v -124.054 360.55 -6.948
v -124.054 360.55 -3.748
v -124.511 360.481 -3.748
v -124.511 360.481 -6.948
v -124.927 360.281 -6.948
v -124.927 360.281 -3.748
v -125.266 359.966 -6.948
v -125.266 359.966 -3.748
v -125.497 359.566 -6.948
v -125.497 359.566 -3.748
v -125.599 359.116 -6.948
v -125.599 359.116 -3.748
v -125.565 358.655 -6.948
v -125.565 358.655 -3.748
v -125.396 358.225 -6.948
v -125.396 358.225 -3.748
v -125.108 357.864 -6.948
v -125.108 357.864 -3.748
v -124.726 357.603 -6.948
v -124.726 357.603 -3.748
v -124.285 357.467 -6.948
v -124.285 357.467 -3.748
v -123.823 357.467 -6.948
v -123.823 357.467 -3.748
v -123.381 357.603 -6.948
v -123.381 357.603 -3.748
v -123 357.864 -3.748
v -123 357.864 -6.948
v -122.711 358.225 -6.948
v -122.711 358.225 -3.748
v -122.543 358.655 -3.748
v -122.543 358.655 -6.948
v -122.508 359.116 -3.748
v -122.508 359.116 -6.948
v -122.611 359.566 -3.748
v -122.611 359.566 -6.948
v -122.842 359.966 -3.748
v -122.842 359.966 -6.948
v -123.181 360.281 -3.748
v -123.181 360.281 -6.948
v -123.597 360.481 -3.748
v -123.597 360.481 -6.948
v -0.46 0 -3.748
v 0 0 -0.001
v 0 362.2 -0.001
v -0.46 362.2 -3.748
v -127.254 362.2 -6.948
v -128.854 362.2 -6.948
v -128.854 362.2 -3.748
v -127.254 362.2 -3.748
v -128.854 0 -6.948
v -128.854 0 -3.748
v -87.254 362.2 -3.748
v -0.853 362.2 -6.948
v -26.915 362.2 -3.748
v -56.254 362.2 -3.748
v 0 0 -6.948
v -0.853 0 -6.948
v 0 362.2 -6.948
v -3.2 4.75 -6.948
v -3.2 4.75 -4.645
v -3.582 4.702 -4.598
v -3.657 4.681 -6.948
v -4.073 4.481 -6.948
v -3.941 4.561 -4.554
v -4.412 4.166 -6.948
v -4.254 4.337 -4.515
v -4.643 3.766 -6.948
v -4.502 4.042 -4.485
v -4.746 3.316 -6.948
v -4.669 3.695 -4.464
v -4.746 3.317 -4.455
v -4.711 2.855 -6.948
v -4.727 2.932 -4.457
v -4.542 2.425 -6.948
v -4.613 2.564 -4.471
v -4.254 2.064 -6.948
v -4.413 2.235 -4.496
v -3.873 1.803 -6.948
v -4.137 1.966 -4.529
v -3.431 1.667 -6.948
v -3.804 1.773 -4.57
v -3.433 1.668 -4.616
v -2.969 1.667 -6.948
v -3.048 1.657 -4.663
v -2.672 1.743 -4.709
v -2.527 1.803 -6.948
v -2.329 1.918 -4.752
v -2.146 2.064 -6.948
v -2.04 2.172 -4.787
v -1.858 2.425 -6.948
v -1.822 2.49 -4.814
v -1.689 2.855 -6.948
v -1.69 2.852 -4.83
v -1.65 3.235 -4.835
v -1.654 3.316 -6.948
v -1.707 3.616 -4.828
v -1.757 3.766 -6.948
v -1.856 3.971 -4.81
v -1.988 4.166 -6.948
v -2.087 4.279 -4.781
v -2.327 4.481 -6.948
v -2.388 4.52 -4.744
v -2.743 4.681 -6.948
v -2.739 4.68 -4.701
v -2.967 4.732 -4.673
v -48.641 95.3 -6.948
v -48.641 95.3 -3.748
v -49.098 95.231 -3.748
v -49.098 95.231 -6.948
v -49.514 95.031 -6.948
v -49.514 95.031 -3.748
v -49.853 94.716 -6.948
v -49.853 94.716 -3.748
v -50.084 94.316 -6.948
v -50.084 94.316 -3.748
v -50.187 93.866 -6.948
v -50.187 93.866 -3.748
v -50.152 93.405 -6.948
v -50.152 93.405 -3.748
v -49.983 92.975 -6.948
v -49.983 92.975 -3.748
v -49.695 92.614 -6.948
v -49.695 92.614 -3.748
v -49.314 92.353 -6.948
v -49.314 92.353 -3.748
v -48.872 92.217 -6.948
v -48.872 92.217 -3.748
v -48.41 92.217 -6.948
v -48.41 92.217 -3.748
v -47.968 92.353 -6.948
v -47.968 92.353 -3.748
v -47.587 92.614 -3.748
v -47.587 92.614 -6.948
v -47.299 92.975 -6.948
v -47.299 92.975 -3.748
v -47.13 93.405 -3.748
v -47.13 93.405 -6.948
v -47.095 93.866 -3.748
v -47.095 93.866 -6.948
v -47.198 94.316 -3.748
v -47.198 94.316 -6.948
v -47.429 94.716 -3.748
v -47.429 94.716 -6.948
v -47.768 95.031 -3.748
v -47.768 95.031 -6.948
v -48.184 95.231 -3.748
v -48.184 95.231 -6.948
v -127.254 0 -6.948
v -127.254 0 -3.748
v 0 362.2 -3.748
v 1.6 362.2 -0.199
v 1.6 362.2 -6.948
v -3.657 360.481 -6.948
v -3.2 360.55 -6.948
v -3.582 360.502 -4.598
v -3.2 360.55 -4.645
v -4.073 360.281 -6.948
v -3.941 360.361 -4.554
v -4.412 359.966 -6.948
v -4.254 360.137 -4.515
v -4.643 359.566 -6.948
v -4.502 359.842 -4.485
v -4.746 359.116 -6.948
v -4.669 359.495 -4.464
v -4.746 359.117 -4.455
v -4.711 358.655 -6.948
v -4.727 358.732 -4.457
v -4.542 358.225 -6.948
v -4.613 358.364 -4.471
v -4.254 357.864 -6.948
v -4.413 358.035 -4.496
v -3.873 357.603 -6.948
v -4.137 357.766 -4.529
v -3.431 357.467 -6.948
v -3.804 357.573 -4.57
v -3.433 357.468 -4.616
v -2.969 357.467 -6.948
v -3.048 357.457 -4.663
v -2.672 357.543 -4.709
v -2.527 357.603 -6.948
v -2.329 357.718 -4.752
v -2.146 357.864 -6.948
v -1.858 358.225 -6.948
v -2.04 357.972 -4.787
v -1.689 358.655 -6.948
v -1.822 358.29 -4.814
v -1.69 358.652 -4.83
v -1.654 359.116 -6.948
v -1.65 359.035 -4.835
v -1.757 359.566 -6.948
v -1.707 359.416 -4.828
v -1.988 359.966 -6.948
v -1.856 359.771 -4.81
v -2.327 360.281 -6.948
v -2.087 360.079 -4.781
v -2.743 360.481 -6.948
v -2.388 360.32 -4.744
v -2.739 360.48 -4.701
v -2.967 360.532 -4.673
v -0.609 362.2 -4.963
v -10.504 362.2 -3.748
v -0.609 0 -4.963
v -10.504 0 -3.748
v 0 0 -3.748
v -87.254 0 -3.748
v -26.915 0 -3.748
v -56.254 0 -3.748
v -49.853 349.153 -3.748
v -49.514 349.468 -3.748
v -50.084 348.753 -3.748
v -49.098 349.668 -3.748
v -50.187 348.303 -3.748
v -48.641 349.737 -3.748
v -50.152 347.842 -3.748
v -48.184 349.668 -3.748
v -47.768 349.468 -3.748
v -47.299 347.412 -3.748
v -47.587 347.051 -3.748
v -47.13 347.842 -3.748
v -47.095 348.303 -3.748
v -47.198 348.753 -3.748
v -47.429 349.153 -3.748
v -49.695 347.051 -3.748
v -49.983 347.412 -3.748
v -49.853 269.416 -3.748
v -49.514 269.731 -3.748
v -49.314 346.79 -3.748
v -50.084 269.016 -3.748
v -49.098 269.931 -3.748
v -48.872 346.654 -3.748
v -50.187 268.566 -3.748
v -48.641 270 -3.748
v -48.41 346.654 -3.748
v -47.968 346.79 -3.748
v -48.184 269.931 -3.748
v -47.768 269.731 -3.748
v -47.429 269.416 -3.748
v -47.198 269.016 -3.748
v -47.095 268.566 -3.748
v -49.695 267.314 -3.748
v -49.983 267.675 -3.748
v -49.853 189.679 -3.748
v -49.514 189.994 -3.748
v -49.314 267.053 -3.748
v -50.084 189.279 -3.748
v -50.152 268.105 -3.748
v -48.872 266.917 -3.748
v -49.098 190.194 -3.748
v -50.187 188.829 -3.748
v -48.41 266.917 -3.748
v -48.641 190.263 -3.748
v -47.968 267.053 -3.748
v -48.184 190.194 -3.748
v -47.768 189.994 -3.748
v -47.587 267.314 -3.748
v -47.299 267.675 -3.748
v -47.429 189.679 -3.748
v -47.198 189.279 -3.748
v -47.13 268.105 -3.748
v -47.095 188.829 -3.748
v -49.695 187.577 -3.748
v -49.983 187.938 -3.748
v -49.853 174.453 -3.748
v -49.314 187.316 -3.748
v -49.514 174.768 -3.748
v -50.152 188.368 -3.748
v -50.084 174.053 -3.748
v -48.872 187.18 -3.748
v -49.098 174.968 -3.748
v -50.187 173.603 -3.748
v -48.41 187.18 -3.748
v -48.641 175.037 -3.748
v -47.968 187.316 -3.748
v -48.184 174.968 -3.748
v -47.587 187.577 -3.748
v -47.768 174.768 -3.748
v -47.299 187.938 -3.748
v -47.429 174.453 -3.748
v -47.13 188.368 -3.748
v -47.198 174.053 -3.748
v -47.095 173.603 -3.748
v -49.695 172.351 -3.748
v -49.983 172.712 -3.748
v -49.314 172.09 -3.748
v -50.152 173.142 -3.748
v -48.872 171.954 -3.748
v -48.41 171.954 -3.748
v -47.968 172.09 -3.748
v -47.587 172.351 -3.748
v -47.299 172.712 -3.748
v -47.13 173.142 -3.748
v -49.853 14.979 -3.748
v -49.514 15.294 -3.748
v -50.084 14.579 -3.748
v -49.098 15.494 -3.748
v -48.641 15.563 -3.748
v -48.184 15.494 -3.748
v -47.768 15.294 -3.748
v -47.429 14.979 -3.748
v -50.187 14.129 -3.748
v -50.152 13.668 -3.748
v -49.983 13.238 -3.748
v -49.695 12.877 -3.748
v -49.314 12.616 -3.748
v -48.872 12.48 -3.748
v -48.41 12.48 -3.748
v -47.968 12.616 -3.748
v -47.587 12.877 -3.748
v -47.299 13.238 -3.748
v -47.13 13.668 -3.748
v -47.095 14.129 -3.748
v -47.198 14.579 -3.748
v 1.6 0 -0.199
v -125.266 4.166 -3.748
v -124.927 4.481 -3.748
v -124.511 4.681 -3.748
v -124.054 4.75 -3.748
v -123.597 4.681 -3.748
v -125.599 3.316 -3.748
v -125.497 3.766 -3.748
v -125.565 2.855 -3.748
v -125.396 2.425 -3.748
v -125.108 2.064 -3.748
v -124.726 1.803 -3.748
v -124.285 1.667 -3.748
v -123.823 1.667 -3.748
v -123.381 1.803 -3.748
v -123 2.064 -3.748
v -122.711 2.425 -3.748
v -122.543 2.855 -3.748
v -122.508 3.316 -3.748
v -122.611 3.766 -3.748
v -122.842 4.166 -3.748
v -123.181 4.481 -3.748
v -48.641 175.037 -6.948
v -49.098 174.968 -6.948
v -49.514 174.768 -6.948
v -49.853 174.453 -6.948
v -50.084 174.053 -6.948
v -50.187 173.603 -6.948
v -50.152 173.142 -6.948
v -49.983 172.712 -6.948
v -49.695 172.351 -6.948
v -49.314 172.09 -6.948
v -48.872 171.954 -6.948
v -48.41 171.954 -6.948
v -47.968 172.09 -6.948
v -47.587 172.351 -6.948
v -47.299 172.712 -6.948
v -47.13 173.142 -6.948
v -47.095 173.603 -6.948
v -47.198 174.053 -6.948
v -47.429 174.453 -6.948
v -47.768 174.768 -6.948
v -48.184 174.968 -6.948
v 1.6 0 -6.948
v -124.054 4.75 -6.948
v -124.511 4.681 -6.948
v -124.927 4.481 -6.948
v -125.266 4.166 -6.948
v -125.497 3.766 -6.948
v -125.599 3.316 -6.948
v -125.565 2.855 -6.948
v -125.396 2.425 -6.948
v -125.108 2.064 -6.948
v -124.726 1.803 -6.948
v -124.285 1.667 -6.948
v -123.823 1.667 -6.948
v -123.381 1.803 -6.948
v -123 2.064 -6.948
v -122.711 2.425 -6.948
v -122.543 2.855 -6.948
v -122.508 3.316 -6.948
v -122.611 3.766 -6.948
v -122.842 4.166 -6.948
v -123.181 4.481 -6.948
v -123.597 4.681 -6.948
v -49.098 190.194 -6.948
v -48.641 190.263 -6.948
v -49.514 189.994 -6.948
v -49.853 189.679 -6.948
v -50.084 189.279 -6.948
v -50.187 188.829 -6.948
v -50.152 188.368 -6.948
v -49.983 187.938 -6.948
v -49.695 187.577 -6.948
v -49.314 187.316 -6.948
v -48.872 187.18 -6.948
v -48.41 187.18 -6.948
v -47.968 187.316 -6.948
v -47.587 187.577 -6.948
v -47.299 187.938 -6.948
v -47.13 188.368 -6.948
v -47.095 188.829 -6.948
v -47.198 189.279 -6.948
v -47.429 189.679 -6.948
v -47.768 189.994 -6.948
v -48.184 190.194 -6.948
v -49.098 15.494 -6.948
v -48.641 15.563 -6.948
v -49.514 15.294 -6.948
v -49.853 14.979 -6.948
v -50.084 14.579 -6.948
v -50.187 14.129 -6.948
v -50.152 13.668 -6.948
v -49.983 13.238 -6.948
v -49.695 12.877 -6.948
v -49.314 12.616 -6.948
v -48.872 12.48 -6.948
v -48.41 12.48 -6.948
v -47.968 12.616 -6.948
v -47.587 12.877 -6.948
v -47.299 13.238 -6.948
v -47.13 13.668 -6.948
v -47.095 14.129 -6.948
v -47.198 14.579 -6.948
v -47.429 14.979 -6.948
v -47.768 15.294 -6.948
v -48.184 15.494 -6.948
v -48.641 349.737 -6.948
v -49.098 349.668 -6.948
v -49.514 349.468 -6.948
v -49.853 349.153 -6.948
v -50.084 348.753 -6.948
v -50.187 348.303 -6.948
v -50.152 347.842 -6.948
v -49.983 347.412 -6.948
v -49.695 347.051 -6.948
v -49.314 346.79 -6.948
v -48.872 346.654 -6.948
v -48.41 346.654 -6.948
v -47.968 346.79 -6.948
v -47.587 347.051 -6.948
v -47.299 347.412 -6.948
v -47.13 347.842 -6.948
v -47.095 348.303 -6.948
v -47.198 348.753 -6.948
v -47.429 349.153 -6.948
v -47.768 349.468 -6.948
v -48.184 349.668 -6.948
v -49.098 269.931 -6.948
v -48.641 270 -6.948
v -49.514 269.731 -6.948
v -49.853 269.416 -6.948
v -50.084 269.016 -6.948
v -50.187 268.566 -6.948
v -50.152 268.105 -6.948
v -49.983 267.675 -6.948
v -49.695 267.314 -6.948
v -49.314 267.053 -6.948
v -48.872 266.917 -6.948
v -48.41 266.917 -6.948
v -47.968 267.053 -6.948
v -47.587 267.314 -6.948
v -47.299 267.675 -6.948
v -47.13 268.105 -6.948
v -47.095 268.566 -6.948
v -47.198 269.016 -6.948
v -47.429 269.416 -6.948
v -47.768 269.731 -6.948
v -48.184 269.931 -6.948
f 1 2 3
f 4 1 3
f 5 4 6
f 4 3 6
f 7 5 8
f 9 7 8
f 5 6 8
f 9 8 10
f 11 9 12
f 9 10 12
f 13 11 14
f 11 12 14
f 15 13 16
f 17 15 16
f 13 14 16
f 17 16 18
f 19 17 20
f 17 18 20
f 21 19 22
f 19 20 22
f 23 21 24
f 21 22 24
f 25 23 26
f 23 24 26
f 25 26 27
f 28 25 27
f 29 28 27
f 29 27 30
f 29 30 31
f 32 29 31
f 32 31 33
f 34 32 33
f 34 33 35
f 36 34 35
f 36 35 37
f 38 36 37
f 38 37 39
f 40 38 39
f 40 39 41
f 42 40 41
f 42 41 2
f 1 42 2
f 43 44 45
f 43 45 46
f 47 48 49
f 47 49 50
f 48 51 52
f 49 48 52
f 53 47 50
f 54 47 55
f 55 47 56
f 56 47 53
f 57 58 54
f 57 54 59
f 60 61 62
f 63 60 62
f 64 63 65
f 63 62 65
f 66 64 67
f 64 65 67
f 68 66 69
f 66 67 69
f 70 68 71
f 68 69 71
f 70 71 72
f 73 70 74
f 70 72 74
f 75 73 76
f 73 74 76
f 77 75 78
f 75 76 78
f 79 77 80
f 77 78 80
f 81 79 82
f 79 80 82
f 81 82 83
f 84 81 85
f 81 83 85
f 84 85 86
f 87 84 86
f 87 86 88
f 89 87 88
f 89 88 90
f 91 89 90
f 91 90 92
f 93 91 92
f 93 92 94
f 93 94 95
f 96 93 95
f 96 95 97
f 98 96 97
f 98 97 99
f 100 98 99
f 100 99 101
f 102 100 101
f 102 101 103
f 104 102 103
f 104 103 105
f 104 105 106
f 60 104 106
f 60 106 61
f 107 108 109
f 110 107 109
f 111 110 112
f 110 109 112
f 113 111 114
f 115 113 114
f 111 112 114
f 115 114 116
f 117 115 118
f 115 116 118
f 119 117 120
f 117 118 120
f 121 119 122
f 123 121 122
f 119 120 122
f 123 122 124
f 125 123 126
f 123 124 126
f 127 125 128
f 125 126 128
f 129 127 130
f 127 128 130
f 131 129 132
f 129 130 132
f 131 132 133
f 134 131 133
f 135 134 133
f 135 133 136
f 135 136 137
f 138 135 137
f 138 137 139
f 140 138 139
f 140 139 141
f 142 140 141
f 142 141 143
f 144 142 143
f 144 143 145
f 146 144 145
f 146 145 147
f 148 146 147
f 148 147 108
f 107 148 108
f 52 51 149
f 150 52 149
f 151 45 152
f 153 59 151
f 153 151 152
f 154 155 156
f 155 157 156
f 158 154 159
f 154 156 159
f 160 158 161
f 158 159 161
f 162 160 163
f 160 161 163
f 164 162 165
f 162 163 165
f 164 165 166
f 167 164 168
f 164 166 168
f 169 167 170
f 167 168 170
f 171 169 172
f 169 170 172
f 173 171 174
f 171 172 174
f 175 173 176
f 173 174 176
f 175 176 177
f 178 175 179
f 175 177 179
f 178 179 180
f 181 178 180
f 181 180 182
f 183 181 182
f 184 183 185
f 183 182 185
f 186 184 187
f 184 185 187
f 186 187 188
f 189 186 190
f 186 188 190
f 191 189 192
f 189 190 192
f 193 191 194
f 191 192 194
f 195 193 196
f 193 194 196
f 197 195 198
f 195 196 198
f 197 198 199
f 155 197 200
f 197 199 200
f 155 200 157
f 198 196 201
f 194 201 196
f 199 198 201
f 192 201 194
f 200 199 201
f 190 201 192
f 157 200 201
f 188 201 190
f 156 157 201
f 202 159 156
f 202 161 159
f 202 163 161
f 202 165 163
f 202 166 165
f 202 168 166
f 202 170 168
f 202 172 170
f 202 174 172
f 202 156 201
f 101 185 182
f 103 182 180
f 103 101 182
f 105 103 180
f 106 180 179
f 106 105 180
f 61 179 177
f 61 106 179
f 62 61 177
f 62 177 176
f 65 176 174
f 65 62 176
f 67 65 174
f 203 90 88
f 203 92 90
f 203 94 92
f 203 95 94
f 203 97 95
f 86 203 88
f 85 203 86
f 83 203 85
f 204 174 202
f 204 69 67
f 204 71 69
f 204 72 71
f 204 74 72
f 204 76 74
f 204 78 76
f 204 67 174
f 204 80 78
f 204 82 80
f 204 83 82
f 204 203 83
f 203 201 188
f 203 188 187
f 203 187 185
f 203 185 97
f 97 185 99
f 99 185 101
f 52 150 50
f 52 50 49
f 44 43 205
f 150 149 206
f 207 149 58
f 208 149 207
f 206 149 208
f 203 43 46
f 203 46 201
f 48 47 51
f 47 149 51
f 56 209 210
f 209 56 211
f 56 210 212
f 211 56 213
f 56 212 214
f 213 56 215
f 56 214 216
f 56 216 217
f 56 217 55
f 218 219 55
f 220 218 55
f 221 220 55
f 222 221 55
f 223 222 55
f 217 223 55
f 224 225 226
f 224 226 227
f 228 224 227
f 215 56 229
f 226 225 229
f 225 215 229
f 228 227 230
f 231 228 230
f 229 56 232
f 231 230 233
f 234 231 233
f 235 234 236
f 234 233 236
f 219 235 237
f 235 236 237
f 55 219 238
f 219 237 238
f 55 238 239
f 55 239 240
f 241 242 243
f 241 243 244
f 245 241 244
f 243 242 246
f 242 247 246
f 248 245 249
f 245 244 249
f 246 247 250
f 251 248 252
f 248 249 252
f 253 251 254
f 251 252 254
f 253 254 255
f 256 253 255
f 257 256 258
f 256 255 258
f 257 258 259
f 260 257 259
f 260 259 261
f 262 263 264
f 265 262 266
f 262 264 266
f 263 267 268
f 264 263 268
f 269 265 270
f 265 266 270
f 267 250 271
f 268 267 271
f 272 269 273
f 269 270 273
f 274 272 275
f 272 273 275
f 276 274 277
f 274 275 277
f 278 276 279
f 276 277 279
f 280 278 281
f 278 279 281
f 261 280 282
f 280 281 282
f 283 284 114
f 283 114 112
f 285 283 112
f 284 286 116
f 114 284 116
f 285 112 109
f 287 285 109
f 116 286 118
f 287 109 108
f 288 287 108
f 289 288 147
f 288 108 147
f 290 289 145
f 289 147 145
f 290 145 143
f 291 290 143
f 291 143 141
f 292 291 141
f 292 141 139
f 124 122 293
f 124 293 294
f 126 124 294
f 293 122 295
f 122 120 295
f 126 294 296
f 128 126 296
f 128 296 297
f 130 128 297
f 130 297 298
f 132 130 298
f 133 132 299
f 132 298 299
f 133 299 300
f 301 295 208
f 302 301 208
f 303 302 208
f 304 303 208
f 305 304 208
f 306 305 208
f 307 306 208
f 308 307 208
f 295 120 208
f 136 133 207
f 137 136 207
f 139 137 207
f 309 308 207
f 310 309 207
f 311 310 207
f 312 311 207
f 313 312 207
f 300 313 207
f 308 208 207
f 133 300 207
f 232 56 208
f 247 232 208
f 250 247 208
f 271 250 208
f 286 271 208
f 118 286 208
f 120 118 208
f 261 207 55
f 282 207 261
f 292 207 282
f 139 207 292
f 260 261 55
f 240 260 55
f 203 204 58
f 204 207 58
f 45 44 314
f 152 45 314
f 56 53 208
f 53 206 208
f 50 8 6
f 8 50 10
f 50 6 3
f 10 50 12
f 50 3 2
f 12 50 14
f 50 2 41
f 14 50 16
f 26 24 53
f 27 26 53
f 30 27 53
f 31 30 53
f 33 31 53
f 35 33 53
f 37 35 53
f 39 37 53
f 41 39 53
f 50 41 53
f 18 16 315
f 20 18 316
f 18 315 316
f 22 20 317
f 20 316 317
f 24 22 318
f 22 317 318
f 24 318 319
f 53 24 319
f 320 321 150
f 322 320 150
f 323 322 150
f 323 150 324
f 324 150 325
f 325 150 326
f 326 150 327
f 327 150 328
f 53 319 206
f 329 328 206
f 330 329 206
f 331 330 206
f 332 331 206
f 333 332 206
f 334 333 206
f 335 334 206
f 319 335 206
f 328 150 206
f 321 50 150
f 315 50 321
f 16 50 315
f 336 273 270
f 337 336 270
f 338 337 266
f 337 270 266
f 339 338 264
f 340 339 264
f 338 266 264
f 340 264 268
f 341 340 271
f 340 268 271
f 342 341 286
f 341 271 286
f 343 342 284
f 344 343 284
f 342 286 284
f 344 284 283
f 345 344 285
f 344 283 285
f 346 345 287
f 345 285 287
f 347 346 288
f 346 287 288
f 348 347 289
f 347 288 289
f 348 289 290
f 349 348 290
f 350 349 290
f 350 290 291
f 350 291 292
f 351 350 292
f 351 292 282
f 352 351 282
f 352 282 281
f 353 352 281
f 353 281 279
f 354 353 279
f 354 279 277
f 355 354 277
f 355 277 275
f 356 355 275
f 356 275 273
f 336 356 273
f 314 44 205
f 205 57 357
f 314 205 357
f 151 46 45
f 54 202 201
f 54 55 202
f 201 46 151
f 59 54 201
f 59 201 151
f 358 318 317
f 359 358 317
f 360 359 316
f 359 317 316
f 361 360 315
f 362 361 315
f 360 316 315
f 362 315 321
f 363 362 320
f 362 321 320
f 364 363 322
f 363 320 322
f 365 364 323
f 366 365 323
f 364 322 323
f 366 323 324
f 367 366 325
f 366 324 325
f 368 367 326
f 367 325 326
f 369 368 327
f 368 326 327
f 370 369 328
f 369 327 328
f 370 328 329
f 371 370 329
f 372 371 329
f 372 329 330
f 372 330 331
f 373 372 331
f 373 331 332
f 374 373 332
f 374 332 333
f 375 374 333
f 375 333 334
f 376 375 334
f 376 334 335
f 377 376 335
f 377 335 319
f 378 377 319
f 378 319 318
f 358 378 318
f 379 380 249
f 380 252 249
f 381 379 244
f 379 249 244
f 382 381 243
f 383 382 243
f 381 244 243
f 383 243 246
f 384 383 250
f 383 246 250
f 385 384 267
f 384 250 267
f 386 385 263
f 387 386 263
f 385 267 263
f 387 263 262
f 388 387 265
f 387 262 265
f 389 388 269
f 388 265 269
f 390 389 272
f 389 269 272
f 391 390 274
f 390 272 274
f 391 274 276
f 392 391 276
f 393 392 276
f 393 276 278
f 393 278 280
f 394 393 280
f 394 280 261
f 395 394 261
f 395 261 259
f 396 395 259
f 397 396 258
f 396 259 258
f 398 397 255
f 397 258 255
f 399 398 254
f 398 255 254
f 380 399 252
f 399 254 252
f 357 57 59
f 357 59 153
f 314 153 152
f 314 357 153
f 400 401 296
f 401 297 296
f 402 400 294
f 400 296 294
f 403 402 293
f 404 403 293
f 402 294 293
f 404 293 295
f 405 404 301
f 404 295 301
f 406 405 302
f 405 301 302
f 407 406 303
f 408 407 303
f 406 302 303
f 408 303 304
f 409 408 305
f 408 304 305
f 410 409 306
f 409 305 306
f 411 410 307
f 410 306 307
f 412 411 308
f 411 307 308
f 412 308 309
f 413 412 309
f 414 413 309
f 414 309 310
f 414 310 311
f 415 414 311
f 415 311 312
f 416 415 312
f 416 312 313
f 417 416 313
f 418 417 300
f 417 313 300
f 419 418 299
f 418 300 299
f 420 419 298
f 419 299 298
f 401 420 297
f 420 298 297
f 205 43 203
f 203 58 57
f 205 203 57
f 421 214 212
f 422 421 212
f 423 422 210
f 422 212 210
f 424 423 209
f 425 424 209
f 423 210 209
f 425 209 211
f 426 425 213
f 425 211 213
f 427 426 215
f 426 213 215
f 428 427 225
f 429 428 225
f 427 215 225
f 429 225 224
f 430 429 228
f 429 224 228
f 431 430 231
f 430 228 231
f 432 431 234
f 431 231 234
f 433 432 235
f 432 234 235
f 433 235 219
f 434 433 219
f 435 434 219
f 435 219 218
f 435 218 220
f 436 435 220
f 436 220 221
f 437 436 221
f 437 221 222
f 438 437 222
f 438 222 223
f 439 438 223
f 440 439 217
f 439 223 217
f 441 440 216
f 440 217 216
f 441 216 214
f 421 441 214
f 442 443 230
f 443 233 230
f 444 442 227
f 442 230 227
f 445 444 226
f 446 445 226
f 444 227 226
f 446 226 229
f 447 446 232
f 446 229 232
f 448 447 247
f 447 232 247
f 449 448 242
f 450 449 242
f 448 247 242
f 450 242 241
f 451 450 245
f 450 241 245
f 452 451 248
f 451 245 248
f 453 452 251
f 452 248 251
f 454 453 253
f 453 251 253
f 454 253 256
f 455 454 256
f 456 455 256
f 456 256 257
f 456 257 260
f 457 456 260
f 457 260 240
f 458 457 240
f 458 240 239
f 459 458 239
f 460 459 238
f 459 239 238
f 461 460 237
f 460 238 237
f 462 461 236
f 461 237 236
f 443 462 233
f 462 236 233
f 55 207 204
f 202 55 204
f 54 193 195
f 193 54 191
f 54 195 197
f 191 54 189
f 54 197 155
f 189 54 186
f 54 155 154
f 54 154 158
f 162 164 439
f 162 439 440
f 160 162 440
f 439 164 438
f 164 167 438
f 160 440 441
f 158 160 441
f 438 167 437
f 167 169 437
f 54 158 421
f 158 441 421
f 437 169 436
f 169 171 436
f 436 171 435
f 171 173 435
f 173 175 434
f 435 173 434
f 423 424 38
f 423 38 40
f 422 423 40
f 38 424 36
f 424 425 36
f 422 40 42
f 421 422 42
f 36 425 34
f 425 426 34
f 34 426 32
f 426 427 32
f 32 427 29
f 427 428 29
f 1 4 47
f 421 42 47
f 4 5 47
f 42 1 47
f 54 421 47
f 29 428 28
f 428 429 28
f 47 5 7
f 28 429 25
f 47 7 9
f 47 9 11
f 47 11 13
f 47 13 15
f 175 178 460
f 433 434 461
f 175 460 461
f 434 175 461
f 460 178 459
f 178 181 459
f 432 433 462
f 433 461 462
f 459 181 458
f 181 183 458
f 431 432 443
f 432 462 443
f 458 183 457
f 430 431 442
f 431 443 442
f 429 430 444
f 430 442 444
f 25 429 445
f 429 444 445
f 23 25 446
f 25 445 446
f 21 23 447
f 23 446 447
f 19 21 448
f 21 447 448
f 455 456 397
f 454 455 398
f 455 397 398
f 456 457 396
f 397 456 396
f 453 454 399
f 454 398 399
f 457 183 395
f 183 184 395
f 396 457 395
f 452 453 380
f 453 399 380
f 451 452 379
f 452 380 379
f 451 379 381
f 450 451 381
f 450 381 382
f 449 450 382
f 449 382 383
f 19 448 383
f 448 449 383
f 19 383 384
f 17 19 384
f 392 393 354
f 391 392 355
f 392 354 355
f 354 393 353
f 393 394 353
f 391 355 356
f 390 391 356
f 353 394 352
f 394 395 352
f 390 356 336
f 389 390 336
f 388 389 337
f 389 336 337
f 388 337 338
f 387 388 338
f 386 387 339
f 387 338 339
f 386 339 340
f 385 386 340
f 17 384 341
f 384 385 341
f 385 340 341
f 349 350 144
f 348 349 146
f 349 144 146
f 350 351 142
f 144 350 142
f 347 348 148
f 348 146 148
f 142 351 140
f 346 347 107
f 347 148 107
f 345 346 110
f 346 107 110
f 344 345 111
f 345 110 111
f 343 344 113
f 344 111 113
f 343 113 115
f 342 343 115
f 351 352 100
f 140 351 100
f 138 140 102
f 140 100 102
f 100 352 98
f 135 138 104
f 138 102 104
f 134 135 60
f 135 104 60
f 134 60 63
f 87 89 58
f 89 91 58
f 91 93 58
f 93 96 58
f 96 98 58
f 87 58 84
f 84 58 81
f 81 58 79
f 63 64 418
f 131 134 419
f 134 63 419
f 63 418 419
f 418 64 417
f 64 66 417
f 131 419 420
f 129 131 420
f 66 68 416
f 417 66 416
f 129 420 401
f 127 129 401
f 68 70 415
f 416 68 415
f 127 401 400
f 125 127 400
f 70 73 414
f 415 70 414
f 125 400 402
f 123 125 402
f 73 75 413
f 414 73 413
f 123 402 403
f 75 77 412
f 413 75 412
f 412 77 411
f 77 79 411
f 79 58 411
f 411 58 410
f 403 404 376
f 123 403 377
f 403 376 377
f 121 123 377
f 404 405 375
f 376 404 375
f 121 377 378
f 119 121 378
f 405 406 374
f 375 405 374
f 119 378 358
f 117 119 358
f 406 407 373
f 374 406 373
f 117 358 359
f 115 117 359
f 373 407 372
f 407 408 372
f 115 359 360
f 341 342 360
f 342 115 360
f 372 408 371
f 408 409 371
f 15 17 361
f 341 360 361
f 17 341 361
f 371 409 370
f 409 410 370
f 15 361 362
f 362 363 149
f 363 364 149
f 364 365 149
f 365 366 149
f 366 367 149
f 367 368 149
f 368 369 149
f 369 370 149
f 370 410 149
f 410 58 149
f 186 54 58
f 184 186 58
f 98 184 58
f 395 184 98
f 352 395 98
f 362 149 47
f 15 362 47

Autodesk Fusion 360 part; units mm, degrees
sketch "Sketch1" plane through (0, 0, 0) normal (0, 1, 0) x (1, 0, 0)
  line L0 (0, 0) -> (-127.2538, 0)
  line L1 (-127.2538, 0) -> (-127.2538, -15.6248)
  line L2 (-127.2538, -15.6248) -> (0, 0)
  line L3 (-127.2538, 0) -> (-0.0202, 0)
  line L4 (0, 0) -> (-0.8531, 6.9478)
  line L5 (-0.8531, 6.9478) -> (-127.2538, -8.5722)
  line L6 (-127.2538, 6.9478) -> (-127.2538, -15.6248)
  line L7 (-127.2538, -8.5722) -> (-126.4008, -15.5201)
  line L8 (-0.8531, 6.9478) -> (-127.2538, 6.9478)
  line L9 (-0.8531, 6.9478) -> (0, 6.9478)
  line L10 (0, 6.9478) -> (0, 0)
  line L11 (-127.2538, 3.7478) -> (0, 3.7478)
  line L12 (-127.2538, 0.7478) -> (-56.2538, 0.7478)
  line L13 (-127.2538, 6.9478) -> (-128.8538, 6.9478)
  line L14 (0, 6.9478) -> (1.6, 6.9478)
  line L15 (1.6, 6.9478) -> (1.6, 0.1989)
  line L16 (-0.0202, 0) -> (1.6, 0.1989)
  line L17 (-128.8538, 6.9478) -> (-128.8538, -15.8213)
  line L18 (-127.2538, -15.6248) -> (-128.8538, -15.8213)
  line L19 (-0.6093, 4.9627) -> (-127.0101, -10.5573)
  line L20 (-87.2538, -3.6609) -> (-87.2538, 3.7478)
  line L21 (-56.2538, 3.7478) -> (-56.2538, 0.7478)
  line L22 (-127.2538, 3.7478) -> (-128.8538, 3.7478)
  circle A0 centre (-41.0275, 0) radius 2.1736
  dimension "d2" = 7
  dimension "d7" = 7
  dimension "d16" = 127.35
  dimension "d17" = 3.2
  dimension "d18" = 71
  dimension "d19" = 1.6
  dimension "d20" = 1.6
  dimension "d21" = 2
  dimension "d28" = 40
  dimension "d29" = 3
extrude "Extrude1" add sketch "Sketch1" along normal blind 362.2 contours L4 L10 L11 | L10 L14 L15 L16 | L4 L9 L10 L11 | L4 L5 L11 L19 | L5 L6 L8 L11 | L6 L13 L17 L22
sketch "Sketch2" plane through (0, 362.2, 0) normal (0, 1, 0) x (-1, 0, 0)
  line L0 (128.8538, -3.7478) -> (10.504, -3.7478)
  line L1 (0.0003, -0.0024) -> (-1.6, -0.1989)
  line L2 (-1.6, -0.1989) -> (-1.6, -6.9478)
  line L3 (-1.6, -6.9478) -> (128.8538, -6.9478)
  line L4 (128.8538, -6.9478) -> (128.8538, -3.7478)
  line L5 (0.0003, -0.0024) -> (-1.6, -0.1989)
  line L6 (-1.6, -0.1989) -> (-1.6, -6.9478)
  line L7 (-1.6, -6.9478) -> (128.8538, -6.9478)
  line L8 (128.8538, -6.9478) -> (128.8538, -3.7478)
  line L9 (128.8538, -3.7478) -> (0.0003, -0.0024)
  line L10 (0.6093, -4.9627) -> (0.0003, -0.0024)
  line L11 (10.504, -3.7478) -> (0.6093, -4.9627)
sketch "Sketch3" plane through (0, 0, -6.9478) normal (0, 0, -1) x (1, 0, 0)
  line L0 (1.6, 0) -> (-128.8538, 0)
  line L1 (-128.8538, 0) -> (-128.8538, -362.2)
  line L2 (-128.8538, -362.2) -> (1.6, -362.2)
  line L3 (1.6, -362.2) -> (1.6, 0)
  line L4 (1.6, -362.2) -> (-128.8538, -362.2)
  line L5 (-128.8538, -362.2) -> (-128.8538, 0)
  line L6 (-128.8538, 0) -> (1.6, 0)
  line L7 (1.6, 0) -> (1.6, -362.2)
  circle A0 centre (-124.0538, -3.2) radius 1.55
  circle A1 centre (-3.2, -3.2) radius 1.55
  circle A2 centre (-3.2, -359) radius 1.55
  circle A3 centre (-124.0538, -359) radius 1.55
  line L8 (-48.641, 0) -> (-48.641, -362.2)
  line L9 (-128.8538, -181.1) -> (1.6, -181.1)
  line L10 (-48.641, -268.45) -> (1.6, -268.45)
  circle A4 centre (-48.641, -268.45) radius 1.55
  circle A5 centre (-48.641, -348.187) radius 1.55
  line L11 (-128.8538, -362.2) -> (-0.0003, -362.2)
  circle A6 centre (-48.641, -188.713) radius 1.55
  circle A7 centre (-48.641, -173.487) radius 1.55
  line L12 (-48.641, -93.75) -> (1.6, -93.75)
  circle A8 centre (-48.641, -93.75) radius 1.55
  circle A9 centre (-48.641, -14.013) radius 1.55
  line L13 (-127.2538, 0) -> (0, 0)
  dimension "d30" = 3.1
  dimension "d31" = 3.2
  dimension "d32" = 4.8
  dimension "d33" = 3.1
  dimension "d34" = 4.8
  dimension "d35" = 3.2
  dimension "d36" = 3.1
  dimension "d37" = 4.8
  dimension "d38" = 3.2
  dimension "d39" = 3.1
  dimension "d40" = 4.8
  dimension "d41" = 3.2
  dimension "d43" = 181.1
  dimension "d44" = 87.35
  dimension "d45" = 50.241
  dimension "d46" = 3.1
  dimension "d47" = 3.1
  dimension "d48" = 14.013
  dimension "d49" = 3.1
  dimension "d50" = 7.613
  dimension "d51" = 3.1
  dimension "d52" = 7.613
  dimension "d53" = 87.35
  dimension "d54" = 3.1
  dimension "d55" = 3.1
  dimension "d56" = 14.013
hole "Hole1" at (-48.641, 173.487, -6.9478) direction (0, 0, 1) diameter 3.1 end through all
hole "Hole2" at (-48.641, 348.187, -6.9478) direction (0, 0, 1) diameter 3.1 end through all
hole "Hole3" at (-48.641, 268.45, -6.9478) direction (0, 0, 1) diameter 3.1 end through all
hole "Hole4" at (-48.641, 188.713, -6.9478) direction (0, 0, 1) diameter 3.1 end through all
hole "Hole5" at (-48.641, 93.75, -6.9478) direction (0, 0, 1) diameter 3.1 end through all
hole "Hole6" at (-48.641, 14.013, -6.9478) direction (0, 0, 1) diameter 3.1 end through all
hole "Hole7" at (-3.2, 359, -6.9478) direction (0, 0, 1) diameter 3.1 end through all
hole "Hole8" at (-124.0538, 359, -6.9478) direction (0, 0, 1) diameter 3.1 end through all
hole "Hole9" at (-3.2, 3.2, -6.9478) direction (0, 0, 1) diameter 3.1 end through all
hole "Hole10" at (-124.0538, 3.2, -6.9478) direction (0, 0, 1) diameter 3.1 end through all
